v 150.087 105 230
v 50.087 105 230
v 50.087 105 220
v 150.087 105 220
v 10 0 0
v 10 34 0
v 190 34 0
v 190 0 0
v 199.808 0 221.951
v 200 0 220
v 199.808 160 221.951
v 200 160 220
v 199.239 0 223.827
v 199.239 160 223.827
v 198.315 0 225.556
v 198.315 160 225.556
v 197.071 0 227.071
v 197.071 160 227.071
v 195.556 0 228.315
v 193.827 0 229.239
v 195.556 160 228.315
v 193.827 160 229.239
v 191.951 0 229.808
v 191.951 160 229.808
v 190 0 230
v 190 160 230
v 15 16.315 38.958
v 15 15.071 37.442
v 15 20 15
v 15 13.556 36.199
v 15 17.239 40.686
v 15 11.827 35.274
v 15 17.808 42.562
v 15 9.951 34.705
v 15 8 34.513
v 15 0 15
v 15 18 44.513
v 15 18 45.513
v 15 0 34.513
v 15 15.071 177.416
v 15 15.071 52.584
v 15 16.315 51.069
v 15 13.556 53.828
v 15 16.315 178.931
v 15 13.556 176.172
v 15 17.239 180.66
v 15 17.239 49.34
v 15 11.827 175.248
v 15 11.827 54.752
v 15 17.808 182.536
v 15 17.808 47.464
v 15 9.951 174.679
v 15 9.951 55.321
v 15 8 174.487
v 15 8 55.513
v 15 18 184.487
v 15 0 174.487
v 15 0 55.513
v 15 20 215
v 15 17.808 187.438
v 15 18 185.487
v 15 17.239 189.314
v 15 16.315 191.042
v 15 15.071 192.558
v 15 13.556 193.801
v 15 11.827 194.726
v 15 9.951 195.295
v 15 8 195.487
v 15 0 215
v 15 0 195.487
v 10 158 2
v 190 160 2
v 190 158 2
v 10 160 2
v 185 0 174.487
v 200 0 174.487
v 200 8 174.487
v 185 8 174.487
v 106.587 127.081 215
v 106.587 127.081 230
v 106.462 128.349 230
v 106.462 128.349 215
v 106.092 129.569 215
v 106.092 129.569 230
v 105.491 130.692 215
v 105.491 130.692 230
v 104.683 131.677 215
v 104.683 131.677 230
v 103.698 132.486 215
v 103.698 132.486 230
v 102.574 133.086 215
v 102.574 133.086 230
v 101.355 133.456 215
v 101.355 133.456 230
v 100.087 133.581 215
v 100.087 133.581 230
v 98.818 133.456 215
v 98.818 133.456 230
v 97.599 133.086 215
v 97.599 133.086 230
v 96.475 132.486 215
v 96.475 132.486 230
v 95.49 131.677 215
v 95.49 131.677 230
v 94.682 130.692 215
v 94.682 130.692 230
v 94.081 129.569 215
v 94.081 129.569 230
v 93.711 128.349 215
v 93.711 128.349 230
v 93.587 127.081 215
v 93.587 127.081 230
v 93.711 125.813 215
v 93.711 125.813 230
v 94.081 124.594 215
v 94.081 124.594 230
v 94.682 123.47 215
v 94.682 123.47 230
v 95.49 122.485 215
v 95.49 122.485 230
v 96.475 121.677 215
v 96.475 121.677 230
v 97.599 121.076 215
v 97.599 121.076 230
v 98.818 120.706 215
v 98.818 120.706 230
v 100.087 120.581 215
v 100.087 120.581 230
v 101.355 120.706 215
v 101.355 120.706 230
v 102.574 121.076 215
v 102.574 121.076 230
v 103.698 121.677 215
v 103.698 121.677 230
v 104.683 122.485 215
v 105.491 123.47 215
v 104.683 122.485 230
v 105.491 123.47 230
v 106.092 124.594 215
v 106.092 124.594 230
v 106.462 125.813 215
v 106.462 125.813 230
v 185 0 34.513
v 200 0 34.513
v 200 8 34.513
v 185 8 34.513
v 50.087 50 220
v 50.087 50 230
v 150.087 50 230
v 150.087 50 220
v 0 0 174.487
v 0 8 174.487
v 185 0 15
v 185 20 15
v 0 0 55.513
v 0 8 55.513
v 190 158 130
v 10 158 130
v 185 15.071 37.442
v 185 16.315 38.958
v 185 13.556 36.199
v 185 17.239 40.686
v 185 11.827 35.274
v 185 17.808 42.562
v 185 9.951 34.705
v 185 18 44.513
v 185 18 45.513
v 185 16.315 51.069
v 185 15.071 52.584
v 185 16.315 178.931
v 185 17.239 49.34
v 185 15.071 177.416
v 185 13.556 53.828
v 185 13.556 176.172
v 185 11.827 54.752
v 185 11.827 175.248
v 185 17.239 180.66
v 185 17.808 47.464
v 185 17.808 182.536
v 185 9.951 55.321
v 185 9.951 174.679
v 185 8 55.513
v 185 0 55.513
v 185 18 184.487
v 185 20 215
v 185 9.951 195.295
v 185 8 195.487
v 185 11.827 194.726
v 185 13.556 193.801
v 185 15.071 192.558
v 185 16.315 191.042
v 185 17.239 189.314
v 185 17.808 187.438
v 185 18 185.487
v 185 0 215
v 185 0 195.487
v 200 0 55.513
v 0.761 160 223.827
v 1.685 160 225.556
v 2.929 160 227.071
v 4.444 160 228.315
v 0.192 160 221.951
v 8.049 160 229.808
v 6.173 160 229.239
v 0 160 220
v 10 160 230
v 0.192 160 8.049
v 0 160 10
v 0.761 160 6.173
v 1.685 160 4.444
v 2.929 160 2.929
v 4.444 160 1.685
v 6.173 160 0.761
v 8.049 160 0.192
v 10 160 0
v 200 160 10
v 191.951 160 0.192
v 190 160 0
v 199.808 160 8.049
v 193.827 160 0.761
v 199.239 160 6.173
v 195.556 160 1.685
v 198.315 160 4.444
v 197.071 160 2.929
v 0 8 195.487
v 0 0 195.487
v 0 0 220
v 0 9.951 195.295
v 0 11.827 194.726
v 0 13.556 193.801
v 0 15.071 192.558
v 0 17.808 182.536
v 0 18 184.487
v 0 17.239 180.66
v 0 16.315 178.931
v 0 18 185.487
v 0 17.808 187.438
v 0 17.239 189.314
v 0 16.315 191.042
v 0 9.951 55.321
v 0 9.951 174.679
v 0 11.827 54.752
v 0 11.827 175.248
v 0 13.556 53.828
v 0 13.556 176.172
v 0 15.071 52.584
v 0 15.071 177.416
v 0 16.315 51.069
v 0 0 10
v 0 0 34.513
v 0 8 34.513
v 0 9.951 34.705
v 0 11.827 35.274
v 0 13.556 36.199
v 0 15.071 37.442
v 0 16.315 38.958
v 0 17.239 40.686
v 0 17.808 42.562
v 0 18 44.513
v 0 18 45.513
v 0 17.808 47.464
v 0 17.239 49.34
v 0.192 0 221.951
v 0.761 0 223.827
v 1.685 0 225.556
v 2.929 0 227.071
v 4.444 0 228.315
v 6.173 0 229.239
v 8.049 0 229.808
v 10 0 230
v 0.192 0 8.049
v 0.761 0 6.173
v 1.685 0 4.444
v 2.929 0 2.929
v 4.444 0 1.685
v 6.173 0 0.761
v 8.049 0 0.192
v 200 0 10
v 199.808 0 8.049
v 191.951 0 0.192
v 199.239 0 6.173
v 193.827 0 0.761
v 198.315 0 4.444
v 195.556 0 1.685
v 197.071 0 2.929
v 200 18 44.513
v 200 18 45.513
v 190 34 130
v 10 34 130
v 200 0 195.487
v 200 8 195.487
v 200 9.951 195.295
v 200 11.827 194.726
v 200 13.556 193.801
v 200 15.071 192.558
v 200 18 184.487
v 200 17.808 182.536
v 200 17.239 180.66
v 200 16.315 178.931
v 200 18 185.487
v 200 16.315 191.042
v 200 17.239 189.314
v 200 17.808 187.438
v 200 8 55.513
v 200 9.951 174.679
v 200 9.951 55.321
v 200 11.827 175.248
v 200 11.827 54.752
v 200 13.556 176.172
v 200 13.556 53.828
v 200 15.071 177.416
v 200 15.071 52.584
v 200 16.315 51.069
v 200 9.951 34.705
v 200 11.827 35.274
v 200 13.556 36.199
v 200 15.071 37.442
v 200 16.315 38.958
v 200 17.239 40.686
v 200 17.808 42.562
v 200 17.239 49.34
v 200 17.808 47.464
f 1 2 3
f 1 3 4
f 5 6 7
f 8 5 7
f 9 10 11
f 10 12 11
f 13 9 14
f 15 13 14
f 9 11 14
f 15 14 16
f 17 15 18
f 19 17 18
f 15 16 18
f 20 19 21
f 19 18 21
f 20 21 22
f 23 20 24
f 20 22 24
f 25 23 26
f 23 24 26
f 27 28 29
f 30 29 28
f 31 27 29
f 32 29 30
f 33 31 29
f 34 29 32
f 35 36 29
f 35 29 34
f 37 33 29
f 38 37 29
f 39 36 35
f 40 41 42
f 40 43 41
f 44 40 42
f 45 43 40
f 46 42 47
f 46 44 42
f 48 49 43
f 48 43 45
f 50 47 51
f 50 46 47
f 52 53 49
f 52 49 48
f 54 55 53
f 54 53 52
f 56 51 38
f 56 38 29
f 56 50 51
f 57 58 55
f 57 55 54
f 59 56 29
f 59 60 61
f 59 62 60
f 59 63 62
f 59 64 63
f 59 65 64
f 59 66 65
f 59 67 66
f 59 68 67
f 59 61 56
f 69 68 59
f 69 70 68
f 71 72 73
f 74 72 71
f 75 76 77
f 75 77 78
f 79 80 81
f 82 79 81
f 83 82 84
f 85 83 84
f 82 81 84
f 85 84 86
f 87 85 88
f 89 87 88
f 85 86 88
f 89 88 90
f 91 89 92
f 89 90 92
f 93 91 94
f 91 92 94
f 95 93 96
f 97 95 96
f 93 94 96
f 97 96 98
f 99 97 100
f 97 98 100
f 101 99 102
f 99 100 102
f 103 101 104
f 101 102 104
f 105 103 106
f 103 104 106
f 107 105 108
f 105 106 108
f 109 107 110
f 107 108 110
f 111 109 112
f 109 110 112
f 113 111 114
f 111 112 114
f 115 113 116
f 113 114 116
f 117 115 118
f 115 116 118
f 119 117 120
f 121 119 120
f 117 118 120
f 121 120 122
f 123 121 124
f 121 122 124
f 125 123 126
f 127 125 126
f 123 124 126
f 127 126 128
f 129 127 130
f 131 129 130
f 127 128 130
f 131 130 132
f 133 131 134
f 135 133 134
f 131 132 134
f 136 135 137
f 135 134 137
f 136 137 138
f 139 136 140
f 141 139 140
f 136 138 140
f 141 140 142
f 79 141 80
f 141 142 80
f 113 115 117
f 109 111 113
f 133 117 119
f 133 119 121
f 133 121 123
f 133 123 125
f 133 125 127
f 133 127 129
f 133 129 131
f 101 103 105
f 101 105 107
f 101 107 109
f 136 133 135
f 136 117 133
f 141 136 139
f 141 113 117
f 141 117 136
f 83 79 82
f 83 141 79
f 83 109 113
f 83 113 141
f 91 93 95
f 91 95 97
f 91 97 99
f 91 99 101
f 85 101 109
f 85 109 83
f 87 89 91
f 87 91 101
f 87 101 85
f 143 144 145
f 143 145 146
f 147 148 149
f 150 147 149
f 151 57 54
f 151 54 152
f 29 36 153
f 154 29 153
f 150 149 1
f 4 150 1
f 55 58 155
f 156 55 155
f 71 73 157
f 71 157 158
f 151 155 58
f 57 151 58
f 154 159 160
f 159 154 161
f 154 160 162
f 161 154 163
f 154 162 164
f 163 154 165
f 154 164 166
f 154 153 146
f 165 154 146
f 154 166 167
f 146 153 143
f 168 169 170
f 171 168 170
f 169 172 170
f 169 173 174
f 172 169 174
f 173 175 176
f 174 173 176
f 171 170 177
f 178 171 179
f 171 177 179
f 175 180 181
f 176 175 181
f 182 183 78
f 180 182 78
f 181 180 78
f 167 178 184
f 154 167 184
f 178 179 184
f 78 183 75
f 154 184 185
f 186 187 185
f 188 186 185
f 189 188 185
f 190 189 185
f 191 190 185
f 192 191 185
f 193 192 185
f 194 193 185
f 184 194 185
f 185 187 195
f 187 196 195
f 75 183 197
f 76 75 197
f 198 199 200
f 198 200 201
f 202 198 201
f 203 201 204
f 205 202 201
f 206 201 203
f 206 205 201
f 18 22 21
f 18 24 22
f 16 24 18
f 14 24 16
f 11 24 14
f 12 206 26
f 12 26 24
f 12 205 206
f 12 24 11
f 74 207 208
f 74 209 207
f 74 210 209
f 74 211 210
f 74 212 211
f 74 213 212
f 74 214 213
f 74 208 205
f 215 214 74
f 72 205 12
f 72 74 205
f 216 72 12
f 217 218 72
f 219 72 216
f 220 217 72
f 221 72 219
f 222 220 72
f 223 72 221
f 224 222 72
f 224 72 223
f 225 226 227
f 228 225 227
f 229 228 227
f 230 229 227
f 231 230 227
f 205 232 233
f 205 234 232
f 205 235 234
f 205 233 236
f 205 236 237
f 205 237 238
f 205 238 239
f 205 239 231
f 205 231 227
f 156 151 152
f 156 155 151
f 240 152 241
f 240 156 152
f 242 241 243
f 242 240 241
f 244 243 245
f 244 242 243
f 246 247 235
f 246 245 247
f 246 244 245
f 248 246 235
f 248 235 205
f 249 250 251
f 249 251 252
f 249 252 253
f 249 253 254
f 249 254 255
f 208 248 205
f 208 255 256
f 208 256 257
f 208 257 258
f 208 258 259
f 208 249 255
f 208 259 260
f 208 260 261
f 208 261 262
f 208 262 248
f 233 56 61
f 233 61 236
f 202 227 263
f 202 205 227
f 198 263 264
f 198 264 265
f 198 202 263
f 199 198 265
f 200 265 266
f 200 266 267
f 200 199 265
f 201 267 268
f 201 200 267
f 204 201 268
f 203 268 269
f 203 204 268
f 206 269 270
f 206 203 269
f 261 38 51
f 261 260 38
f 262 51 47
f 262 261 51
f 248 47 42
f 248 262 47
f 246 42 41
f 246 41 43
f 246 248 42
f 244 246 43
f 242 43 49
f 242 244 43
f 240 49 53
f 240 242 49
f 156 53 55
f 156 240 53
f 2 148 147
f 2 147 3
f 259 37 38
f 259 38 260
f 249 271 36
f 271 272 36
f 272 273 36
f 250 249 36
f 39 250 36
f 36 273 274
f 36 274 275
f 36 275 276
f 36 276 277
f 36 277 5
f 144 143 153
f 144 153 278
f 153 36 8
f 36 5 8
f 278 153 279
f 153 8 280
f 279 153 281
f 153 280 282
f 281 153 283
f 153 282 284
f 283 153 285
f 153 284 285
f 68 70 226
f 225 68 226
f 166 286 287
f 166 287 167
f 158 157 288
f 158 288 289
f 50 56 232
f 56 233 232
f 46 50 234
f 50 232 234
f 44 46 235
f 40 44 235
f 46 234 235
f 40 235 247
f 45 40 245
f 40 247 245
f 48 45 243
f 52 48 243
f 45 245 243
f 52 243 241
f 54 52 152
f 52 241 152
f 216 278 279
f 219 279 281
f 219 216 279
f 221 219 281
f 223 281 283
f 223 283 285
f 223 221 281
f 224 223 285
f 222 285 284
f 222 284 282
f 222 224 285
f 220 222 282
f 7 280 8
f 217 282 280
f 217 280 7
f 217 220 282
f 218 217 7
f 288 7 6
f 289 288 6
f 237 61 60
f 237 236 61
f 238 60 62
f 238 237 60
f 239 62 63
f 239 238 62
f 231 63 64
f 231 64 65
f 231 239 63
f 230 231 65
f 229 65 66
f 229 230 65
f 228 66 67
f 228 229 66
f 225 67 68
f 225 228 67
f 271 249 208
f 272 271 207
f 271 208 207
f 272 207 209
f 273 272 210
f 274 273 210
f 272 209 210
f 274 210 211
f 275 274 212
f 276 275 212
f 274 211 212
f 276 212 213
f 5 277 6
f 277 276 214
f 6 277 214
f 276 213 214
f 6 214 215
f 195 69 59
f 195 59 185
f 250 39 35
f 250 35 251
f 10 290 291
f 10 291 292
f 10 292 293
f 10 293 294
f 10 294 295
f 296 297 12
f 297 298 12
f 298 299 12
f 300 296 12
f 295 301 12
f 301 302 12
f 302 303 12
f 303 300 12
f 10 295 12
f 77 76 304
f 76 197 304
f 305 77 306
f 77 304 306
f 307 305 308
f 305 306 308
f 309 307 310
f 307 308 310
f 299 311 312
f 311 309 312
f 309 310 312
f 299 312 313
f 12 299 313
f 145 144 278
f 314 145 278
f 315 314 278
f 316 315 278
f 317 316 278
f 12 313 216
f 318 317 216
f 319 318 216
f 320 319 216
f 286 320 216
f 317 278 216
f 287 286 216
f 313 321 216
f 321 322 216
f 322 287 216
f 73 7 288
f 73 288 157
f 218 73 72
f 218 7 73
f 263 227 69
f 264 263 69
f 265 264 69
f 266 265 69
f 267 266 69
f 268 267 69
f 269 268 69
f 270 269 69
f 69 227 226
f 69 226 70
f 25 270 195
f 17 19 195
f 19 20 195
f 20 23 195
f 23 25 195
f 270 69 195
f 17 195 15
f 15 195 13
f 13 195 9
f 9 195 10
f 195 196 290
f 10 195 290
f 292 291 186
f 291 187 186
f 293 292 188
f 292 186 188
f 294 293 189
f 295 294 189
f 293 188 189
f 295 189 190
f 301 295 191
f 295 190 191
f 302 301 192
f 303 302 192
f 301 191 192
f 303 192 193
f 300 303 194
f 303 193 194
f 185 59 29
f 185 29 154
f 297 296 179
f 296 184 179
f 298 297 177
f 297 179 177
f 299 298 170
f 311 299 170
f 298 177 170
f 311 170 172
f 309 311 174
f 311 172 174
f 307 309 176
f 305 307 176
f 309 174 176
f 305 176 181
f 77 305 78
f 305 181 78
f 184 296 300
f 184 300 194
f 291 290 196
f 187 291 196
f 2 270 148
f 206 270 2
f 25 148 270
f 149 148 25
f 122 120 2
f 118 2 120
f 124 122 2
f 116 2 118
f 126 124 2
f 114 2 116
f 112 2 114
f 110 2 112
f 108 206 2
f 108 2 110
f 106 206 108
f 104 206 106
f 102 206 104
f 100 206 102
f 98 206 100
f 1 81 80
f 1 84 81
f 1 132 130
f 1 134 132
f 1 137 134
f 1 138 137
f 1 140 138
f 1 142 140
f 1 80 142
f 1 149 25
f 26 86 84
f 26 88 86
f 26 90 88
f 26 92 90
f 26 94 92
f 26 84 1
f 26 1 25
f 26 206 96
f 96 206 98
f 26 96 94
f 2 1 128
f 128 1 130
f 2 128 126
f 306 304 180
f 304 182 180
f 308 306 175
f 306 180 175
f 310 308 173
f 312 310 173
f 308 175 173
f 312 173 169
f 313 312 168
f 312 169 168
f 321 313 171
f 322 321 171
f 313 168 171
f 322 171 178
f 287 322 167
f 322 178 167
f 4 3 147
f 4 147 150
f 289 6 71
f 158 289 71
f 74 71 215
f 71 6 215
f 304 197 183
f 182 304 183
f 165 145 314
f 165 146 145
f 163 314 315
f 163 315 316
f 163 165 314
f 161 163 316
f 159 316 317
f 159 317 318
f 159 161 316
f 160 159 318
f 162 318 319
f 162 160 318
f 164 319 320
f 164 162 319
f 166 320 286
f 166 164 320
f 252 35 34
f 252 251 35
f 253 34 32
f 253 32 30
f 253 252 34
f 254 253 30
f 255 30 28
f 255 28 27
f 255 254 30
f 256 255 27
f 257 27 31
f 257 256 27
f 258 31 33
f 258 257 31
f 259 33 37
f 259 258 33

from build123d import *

# Parameters (mm, degrees)
ESQUISSE1_W             = 200
ESQUISSE1_H             = 160
BOSS_EXTRU_1_DEPTH      = 230
CONG_1_R                = 10
ESQUISSE2_W             = 170
ESQUISSE2_H             = 200
ENL_V_MAT_EXTRU_1_DEPTH = 20
ESQUISSE3_W             = 15
ESQUISSE3_H             = 21
ENL_V_MAT_EXTRU_2_DEPTH = 18
CONG_2_R                = 10
CONG_3_R                = 10
ESQUISSE6_W             = 180
ESQUISSE6_H             = 124
ENL_V_MAT_EXTRU_4_DEPTH = 130
ESQUISSE7_W             = 180
ESQUISSE7_H             = 2
ENL_V_MAT_EXTRU_5_DEPTH = 2
CONG_5_R                = 10
ESQUISSE8_R             = 6.5
ENL_V_MAT_EXTRU_6_DEPTH = 15
ESQUISSE9_W             = 100
ESQUISSE9_H             = 55
ENL_V_MAT_EXTRU_7_DEPTH = 10


with BuildPart() as part:
    # Esquisse1 → Boss.-Extru.1 (new body)
    with BuildSketch(Plane.XY):
        with Locations((100, 80)):
            Rectangle(ESQUISSE1_W, ESQUISSE1_H)
    extrude(amount=BOSS_EXTRU_1_DEPTH)

    # Congé1
    cong_1_edges = [part.edges().sort_by_distance(p)[0] for p in [
        (200, 80, 230),
        (0, 80, 230),
        (200, 80, 0),
        (0, 80, 0),
    ]]
    fillet(cong_1_edges, radius=CONG_1_R)

    # Esquisse2 → Enlèv. mat.-Extru.1 (cut)
    with BuildSketch(Plane.XZ):
        with Locations((100, 115)):
            Rectangle(ESQUISSE2_W, ESQUISSE2_H)
    extrude(amount=-ENL_V_MAT_EXTRU_1_DEPTH, mode=Mode.SUBTRACT)

    # Esquisse3 → Enlèv. mat.-Extru.2 (cut)
    with BuildSketch(Plane(origin=(0, 0, 0), x_dir=(-1, 0, 0), z_dir=(0, -1, 0))):
        with Locations((-7.5, -45.013282715)):
            Rectangle(ESQUISSE3_W, ESQUISSE3_H)
        with Locations((-192.5, -45.013282715)):
            Rectangle(ESQUISSE3_W, ESQUISSE3_H)
        with Locations((-192.5, -184.986717285)):
            Rectangle(ESQUISSE3_W, ESQUISSE3_H)
        with Locations((-7.5, -184.986717285)):
            Rectangle(ESQUISSE3_W, ESQUISSE3_H)
    extrude(amount=-ENL_V_MAT_EXTRU_2_DEPTH, mode=Mode.SUBTRACT)

    # Congé2
    cong_2_edges = [part.edges().sort_by_distance(p)[0] for p in [
        (192.5, 18, 34.513282715),
        (192.5, 18, 55.513282715),
    ]]
    fillet(cong_2_edges, radius=CONG_2_R)

    # Congé3
    cong_3_edges = [part.edges().sort_by_distance(p)[0] for p in [
        (7.5, 18, 34.513282715),
        (7.5, 18, 55.513282715),
    ]]
    fillet(cong_3_edges, radius=CONG_3_R)

    # Esquisse6 → Enlèv. mat.-Extru.4 (cut)
    with BuildSketch(Plane(origin=(0, 0, 0), x_dir=(-1, 0, 0), z_dir=(0, 0, -1))):
        with Locations((-100, 96)):
            Rectangle(ESQUISSE6_W, ESQUISSE6_H)
    extrude(amount=-ENL_V_MAT_EXTRU_4_DEPTH, mode=Mode.SUBTRACT)

    # Esquisse7 → Enlèv. mat.-Extru.5 (cut)
    with BuildSketch(Plane(origin=(0, 0, 0), x_dir=(-1, 0, 0), z_dir=(0, 0, -1))):
        with Locations((-100, 159)):
            Rectangle(ESQUISSE7_W, ESQUISSE7_H)
    extrude(amount=-ENL_V_MAT_EXTRU_5_DEPTH, mode=Mode.SUBTRACT)

    # Congé5
    cong_5_edges = [part.edges().sort_by_distance(p)[0] for p in [
        (7.5, 18, 195.486717285),
        (7.5, 18, 174.486717285),
        (192.5, 18, 195.486717285),
        (192.5, 18, 174.486717285),
    ]]
    fillet(cong_5_edges, radius=CONG_5_R)

    # Esquisse8 → Enlèv. mat.-Extru.6 (cut)
    with BuildSketch(Plane.XY.offset(230)):
        with Locations((100.086517688, 127.081087589)):
            Circle(ESQUISSE8_R)
    extrude(amount=-ENL_V_MAT_EXTRU_6_DEPTH, mode=Mode.SUBTRACT)

    # Esquisse9 → Enlèv. mat.-Extru.7 (cut)
    with BuildSketch(Plane.XY.offset(230)):
        with Locations((100.086517688, 77.5)):
            Rectangle(ESQUISSE9_W, ESQUISSE9_H)
    extrude(amount=-ENL_V_MAT_EXTRU_7_DEPTH, mode=Mode.SUBTRACT)


solid = part.part
